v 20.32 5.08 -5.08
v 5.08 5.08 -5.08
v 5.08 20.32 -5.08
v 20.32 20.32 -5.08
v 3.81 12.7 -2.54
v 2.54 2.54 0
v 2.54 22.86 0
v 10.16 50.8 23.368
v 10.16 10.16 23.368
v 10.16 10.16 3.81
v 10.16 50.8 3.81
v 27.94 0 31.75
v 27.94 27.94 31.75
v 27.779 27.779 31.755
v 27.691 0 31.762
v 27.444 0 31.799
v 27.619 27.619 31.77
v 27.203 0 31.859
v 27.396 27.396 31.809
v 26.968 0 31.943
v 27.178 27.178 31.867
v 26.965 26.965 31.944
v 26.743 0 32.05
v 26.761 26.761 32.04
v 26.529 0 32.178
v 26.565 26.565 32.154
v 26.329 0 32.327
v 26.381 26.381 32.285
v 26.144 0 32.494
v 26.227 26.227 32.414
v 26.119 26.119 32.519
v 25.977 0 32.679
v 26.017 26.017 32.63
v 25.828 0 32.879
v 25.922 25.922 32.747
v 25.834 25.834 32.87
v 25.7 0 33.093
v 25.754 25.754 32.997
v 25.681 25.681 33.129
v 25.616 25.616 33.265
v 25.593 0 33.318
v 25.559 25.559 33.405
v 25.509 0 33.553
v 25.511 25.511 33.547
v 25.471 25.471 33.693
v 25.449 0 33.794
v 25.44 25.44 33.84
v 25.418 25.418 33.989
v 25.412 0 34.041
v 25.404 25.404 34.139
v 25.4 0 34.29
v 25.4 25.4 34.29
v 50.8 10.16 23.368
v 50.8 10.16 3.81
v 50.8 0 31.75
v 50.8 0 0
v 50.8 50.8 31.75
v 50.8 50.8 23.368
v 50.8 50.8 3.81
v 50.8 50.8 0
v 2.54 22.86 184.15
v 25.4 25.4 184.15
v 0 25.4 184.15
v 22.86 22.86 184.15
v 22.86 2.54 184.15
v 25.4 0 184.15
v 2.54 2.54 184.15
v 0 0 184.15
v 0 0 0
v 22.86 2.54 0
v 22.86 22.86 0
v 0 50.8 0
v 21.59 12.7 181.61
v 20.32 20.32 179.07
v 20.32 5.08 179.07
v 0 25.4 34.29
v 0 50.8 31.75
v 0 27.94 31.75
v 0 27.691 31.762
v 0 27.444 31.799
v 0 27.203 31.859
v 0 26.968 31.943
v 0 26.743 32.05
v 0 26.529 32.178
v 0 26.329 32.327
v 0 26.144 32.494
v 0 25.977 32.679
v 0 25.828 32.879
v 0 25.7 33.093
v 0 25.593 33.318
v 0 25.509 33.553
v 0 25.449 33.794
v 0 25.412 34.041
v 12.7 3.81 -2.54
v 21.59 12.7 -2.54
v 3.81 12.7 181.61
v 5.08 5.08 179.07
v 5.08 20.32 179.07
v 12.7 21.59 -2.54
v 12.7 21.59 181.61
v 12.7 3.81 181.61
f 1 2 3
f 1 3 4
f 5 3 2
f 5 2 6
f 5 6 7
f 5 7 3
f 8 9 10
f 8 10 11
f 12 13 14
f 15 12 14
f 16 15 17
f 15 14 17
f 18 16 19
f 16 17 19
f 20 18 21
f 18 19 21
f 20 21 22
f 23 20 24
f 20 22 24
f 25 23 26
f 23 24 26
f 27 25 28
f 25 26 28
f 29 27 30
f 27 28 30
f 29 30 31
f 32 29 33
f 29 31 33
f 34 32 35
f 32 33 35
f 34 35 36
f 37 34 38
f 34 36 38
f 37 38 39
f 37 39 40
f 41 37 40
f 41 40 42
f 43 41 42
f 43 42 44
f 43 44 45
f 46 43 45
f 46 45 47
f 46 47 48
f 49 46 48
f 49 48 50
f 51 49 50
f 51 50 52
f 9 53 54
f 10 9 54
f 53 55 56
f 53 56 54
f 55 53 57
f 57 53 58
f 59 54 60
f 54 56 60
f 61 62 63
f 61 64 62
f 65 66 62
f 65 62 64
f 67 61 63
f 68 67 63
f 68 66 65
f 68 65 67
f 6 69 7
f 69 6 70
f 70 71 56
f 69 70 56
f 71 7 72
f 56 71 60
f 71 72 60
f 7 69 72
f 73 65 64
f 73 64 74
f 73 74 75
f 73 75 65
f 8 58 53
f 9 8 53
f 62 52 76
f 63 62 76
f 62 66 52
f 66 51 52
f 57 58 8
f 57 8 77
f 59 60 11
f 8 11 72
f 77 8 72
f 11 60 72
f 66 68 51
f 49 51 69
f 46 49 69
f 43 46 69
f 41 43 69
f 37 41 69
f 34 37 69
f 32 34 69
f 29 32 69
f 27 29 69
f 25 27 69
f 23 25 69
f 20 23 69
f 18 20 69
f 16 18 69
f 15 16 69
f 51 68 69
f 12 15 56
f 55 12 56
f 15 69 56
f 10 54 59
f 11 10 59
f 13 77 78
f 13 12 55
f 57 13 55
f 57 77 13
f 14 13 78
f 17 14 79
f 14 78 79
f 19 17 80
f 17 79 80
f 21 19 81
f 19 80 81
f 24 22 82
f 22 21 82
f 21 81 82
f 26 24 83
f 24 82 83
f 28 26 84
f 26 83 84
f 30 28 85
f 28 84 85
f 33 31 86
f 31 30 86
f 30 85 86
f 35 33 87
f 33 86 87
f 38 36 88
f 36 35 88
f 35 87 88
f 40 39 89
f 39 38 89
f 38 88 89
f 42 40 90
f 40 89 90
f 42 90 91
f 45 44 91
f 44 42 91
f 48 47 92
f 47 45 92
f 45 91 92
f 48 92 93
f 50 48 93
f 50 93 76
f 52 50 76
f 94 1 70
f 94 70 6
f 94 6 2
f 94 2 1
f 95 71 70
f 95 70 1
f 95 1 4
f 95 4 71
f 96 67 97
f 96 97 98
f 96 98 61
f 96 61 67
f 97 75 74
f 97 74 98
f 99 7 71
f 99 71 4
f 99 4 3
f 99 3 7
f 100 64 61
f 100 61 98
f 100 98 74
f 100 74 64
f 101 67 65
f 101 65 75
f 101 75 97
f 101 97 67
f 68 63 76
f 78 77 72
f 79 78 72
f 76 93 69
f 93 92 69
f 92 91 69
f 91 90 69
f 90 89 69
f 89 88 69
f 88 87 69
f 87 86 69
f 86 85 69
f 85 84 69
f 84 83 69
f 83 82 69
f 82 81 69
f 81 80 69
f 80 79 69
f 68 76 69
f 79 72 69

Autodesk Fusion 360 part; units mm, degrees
sketch "Sketch1" plane through (0, 0, 0) normal (0, 0, 1) x (1, 0, 0)
  line L0 (0, 0) -> (50.8, 0)
  line L1 (50.8, 0) -> (50.8, 50.8)
  line L2 (50.8, 50.8) -> (0, 50.8)
  line L3 (0, 50.8) -> (0, 0)
  dimension "d1" = 50.8
  dimension "d2" = 50.8
extrude "Extrude1" add sketch "Sketch1" along normal blind 31.75
sketch "Sketch2" plane through (50.8, 0, 0) normal (1, 0, 0) x (0, 1, 0)
  line L0 (0, 0) -> (50.8, 0)
  line L1 (50.8, 0) -> (50.8, 31.75)
  line L2 (50.8, 31.75) -> (0, 31.75)
  line L3 (0, 31.75) -> (0, 0)
  line L4 (50.8, 23.368) -> (10.16, 23.368)
  line L5 (10.16, 23.368) -> (10.16, 3.81)
  line L6 (10.16, 3.81) -> (50.8, 3.81)
  line L7 (50.8, 3.81) -> (50.8, 23.368)
  dimension "d5" = 40.64
  dimension "d6" = 19.558
  dimension "d14" = 3.81
extrude "Extrude2" cut sketch "Sketch2" against normal blind 40.64 contours L1 L4 L5 L6 L7
sketch "Sketch3" plane through (0, 0, 31.75) normal (0, 0, 1) x (-1, 0, 0)
  line L0 (0, -50.8) -> (0, 0)
  line L1 (0, 0) -> (-50.8, 0)
  line L2 (-50.8, 0) -> (-50.8, -50.8)
  line L3 (-50.8, -50.8) -> (0, -50.8)
  line L4 (0, 0) -> (-25.4, 0)
  line L5 (-25.4, 0) -> (-25.4, -25.4)
  line L6 (-25.4, -25.4) -> (0, -25.4)
  line L7 (0, -25.4) -> (0, 0)
  dimension "d10" = 25.4
  dimension "d11" = 25.4
extrude "Extrude3" add sketch "Sketch3" along normal blind 152.4 contours L0 L1 L4 L5 L6 L7
fillet "Fillet1" radius 2.54 2 edges at (25.4, 12.7, 31.75) (12.7, 25.4, 31.75)
sketch "Sketch4" plane through (0, 0, 0) normal (0, 0, -1) x (1, 0, 0)
  line L0 (0, 0) -> (0, -50.8)
  line L1 (0, -50.8) -> (50.8, -50.8)
  line L2 (50.8, -50.8) -> (50.8, 0)
  line L3 (50.8, 0) -> (0, 0)
  line L4 (2.54, -2.54) -> (22.86, -2.54)
  line L5 (22.86, -2.54) -> (22.86, -22.86)
  line L6 (22.86, -22.86) -> (2.54, -22.86)
  line L7 (2.54, -22.86) -> (2.54, -2.54)
  dimension "d17" = 2.54
  dimension "d18" = 2.54
  dimension "d19" = 20.32
  dimension "d20" = 20.32
sketch "Sketch5" plane through (0, 0, 0) normal (0, 0, -1) x (1, 0, 0)
  line L0 (5.08, -5.08) -> (20.32, -5.08)
  line L1 (20.32, -5.08) -> (20.32, -20.32)
  line L2 (20.32, -20.32) -> (5.08, -20.32)
  line L3 (5.08, -20.32) -> (5.08, -5.08)
  line L4 (2.54, -2.54) -> (22.86, -2.54)
  line L5 (2.54, -22.86) -> (2.54, -2.54)
  dimension "d21" = 2.54
  dimension "d22" = 2.54
  dimension "d23" = 15.24
  dimension "d24" = 15.24
extrude "Extrude4" add sketch "Sketch5" along normal blind 5.08
loft "Loft1" add profiles "Sketch4" section 1 contours L4 L5 L6 L7 section 2 face at (10.16, 15.24, -5.08)
sketch "Sketch6" plane through (0, 0, 184.15) normal (0, 0, 1) x (-1, 0, 0)
  line L0 (0, -25.4) -> (0, 0)
  line L1 (0, 0) -> (-25.4, 0)
  line L2 (-25.4, 0) -> (-25.4, -25.4)
  line L3 (-25.4, -25.4) -> (0, -25.4)
  line L4 (-2.54, -22.86) -> (-22.86, -22.86)
  line L5 (-22.86, -22.86) -> (-22.86, -2.54)
  line L6 (-22.86, -2.54) -> (-2.54, -2.54)
  line L7 (-2.54, -2.54) -> (-2.54, -22.86)
  line L8 (-5.08, -20.32) -> (-20.32, -20.32)
  line L9 (-20.32, -20.32) -> (-20.32, -5.08)
  line L10 (-20.32, -5.08) -> (-5.08, -5.08)
  line L11 (-5.08, -5.08) -> (-5.08, -20.32)
  dimension "d27" = 2.54
  dimension "d28" = 2.54
  dimension "d29" = 2.54
  dimension "d30" = 20.32
  dimension "d31" = 2.54
  dimension "d32" = 15.24
  dimension "d33" = 15.24
  dimension "d34" = 2.54
extrude "Extrude5" cut sketch "Sketch6" against normal blind 5.08 contours L8 L9 L10 L11
loft "Loft2" cut profiles "Sketch6" section 1 contours L4 L5 L6 L7 section 2 face at (15.24, 15.24, 179.07)
